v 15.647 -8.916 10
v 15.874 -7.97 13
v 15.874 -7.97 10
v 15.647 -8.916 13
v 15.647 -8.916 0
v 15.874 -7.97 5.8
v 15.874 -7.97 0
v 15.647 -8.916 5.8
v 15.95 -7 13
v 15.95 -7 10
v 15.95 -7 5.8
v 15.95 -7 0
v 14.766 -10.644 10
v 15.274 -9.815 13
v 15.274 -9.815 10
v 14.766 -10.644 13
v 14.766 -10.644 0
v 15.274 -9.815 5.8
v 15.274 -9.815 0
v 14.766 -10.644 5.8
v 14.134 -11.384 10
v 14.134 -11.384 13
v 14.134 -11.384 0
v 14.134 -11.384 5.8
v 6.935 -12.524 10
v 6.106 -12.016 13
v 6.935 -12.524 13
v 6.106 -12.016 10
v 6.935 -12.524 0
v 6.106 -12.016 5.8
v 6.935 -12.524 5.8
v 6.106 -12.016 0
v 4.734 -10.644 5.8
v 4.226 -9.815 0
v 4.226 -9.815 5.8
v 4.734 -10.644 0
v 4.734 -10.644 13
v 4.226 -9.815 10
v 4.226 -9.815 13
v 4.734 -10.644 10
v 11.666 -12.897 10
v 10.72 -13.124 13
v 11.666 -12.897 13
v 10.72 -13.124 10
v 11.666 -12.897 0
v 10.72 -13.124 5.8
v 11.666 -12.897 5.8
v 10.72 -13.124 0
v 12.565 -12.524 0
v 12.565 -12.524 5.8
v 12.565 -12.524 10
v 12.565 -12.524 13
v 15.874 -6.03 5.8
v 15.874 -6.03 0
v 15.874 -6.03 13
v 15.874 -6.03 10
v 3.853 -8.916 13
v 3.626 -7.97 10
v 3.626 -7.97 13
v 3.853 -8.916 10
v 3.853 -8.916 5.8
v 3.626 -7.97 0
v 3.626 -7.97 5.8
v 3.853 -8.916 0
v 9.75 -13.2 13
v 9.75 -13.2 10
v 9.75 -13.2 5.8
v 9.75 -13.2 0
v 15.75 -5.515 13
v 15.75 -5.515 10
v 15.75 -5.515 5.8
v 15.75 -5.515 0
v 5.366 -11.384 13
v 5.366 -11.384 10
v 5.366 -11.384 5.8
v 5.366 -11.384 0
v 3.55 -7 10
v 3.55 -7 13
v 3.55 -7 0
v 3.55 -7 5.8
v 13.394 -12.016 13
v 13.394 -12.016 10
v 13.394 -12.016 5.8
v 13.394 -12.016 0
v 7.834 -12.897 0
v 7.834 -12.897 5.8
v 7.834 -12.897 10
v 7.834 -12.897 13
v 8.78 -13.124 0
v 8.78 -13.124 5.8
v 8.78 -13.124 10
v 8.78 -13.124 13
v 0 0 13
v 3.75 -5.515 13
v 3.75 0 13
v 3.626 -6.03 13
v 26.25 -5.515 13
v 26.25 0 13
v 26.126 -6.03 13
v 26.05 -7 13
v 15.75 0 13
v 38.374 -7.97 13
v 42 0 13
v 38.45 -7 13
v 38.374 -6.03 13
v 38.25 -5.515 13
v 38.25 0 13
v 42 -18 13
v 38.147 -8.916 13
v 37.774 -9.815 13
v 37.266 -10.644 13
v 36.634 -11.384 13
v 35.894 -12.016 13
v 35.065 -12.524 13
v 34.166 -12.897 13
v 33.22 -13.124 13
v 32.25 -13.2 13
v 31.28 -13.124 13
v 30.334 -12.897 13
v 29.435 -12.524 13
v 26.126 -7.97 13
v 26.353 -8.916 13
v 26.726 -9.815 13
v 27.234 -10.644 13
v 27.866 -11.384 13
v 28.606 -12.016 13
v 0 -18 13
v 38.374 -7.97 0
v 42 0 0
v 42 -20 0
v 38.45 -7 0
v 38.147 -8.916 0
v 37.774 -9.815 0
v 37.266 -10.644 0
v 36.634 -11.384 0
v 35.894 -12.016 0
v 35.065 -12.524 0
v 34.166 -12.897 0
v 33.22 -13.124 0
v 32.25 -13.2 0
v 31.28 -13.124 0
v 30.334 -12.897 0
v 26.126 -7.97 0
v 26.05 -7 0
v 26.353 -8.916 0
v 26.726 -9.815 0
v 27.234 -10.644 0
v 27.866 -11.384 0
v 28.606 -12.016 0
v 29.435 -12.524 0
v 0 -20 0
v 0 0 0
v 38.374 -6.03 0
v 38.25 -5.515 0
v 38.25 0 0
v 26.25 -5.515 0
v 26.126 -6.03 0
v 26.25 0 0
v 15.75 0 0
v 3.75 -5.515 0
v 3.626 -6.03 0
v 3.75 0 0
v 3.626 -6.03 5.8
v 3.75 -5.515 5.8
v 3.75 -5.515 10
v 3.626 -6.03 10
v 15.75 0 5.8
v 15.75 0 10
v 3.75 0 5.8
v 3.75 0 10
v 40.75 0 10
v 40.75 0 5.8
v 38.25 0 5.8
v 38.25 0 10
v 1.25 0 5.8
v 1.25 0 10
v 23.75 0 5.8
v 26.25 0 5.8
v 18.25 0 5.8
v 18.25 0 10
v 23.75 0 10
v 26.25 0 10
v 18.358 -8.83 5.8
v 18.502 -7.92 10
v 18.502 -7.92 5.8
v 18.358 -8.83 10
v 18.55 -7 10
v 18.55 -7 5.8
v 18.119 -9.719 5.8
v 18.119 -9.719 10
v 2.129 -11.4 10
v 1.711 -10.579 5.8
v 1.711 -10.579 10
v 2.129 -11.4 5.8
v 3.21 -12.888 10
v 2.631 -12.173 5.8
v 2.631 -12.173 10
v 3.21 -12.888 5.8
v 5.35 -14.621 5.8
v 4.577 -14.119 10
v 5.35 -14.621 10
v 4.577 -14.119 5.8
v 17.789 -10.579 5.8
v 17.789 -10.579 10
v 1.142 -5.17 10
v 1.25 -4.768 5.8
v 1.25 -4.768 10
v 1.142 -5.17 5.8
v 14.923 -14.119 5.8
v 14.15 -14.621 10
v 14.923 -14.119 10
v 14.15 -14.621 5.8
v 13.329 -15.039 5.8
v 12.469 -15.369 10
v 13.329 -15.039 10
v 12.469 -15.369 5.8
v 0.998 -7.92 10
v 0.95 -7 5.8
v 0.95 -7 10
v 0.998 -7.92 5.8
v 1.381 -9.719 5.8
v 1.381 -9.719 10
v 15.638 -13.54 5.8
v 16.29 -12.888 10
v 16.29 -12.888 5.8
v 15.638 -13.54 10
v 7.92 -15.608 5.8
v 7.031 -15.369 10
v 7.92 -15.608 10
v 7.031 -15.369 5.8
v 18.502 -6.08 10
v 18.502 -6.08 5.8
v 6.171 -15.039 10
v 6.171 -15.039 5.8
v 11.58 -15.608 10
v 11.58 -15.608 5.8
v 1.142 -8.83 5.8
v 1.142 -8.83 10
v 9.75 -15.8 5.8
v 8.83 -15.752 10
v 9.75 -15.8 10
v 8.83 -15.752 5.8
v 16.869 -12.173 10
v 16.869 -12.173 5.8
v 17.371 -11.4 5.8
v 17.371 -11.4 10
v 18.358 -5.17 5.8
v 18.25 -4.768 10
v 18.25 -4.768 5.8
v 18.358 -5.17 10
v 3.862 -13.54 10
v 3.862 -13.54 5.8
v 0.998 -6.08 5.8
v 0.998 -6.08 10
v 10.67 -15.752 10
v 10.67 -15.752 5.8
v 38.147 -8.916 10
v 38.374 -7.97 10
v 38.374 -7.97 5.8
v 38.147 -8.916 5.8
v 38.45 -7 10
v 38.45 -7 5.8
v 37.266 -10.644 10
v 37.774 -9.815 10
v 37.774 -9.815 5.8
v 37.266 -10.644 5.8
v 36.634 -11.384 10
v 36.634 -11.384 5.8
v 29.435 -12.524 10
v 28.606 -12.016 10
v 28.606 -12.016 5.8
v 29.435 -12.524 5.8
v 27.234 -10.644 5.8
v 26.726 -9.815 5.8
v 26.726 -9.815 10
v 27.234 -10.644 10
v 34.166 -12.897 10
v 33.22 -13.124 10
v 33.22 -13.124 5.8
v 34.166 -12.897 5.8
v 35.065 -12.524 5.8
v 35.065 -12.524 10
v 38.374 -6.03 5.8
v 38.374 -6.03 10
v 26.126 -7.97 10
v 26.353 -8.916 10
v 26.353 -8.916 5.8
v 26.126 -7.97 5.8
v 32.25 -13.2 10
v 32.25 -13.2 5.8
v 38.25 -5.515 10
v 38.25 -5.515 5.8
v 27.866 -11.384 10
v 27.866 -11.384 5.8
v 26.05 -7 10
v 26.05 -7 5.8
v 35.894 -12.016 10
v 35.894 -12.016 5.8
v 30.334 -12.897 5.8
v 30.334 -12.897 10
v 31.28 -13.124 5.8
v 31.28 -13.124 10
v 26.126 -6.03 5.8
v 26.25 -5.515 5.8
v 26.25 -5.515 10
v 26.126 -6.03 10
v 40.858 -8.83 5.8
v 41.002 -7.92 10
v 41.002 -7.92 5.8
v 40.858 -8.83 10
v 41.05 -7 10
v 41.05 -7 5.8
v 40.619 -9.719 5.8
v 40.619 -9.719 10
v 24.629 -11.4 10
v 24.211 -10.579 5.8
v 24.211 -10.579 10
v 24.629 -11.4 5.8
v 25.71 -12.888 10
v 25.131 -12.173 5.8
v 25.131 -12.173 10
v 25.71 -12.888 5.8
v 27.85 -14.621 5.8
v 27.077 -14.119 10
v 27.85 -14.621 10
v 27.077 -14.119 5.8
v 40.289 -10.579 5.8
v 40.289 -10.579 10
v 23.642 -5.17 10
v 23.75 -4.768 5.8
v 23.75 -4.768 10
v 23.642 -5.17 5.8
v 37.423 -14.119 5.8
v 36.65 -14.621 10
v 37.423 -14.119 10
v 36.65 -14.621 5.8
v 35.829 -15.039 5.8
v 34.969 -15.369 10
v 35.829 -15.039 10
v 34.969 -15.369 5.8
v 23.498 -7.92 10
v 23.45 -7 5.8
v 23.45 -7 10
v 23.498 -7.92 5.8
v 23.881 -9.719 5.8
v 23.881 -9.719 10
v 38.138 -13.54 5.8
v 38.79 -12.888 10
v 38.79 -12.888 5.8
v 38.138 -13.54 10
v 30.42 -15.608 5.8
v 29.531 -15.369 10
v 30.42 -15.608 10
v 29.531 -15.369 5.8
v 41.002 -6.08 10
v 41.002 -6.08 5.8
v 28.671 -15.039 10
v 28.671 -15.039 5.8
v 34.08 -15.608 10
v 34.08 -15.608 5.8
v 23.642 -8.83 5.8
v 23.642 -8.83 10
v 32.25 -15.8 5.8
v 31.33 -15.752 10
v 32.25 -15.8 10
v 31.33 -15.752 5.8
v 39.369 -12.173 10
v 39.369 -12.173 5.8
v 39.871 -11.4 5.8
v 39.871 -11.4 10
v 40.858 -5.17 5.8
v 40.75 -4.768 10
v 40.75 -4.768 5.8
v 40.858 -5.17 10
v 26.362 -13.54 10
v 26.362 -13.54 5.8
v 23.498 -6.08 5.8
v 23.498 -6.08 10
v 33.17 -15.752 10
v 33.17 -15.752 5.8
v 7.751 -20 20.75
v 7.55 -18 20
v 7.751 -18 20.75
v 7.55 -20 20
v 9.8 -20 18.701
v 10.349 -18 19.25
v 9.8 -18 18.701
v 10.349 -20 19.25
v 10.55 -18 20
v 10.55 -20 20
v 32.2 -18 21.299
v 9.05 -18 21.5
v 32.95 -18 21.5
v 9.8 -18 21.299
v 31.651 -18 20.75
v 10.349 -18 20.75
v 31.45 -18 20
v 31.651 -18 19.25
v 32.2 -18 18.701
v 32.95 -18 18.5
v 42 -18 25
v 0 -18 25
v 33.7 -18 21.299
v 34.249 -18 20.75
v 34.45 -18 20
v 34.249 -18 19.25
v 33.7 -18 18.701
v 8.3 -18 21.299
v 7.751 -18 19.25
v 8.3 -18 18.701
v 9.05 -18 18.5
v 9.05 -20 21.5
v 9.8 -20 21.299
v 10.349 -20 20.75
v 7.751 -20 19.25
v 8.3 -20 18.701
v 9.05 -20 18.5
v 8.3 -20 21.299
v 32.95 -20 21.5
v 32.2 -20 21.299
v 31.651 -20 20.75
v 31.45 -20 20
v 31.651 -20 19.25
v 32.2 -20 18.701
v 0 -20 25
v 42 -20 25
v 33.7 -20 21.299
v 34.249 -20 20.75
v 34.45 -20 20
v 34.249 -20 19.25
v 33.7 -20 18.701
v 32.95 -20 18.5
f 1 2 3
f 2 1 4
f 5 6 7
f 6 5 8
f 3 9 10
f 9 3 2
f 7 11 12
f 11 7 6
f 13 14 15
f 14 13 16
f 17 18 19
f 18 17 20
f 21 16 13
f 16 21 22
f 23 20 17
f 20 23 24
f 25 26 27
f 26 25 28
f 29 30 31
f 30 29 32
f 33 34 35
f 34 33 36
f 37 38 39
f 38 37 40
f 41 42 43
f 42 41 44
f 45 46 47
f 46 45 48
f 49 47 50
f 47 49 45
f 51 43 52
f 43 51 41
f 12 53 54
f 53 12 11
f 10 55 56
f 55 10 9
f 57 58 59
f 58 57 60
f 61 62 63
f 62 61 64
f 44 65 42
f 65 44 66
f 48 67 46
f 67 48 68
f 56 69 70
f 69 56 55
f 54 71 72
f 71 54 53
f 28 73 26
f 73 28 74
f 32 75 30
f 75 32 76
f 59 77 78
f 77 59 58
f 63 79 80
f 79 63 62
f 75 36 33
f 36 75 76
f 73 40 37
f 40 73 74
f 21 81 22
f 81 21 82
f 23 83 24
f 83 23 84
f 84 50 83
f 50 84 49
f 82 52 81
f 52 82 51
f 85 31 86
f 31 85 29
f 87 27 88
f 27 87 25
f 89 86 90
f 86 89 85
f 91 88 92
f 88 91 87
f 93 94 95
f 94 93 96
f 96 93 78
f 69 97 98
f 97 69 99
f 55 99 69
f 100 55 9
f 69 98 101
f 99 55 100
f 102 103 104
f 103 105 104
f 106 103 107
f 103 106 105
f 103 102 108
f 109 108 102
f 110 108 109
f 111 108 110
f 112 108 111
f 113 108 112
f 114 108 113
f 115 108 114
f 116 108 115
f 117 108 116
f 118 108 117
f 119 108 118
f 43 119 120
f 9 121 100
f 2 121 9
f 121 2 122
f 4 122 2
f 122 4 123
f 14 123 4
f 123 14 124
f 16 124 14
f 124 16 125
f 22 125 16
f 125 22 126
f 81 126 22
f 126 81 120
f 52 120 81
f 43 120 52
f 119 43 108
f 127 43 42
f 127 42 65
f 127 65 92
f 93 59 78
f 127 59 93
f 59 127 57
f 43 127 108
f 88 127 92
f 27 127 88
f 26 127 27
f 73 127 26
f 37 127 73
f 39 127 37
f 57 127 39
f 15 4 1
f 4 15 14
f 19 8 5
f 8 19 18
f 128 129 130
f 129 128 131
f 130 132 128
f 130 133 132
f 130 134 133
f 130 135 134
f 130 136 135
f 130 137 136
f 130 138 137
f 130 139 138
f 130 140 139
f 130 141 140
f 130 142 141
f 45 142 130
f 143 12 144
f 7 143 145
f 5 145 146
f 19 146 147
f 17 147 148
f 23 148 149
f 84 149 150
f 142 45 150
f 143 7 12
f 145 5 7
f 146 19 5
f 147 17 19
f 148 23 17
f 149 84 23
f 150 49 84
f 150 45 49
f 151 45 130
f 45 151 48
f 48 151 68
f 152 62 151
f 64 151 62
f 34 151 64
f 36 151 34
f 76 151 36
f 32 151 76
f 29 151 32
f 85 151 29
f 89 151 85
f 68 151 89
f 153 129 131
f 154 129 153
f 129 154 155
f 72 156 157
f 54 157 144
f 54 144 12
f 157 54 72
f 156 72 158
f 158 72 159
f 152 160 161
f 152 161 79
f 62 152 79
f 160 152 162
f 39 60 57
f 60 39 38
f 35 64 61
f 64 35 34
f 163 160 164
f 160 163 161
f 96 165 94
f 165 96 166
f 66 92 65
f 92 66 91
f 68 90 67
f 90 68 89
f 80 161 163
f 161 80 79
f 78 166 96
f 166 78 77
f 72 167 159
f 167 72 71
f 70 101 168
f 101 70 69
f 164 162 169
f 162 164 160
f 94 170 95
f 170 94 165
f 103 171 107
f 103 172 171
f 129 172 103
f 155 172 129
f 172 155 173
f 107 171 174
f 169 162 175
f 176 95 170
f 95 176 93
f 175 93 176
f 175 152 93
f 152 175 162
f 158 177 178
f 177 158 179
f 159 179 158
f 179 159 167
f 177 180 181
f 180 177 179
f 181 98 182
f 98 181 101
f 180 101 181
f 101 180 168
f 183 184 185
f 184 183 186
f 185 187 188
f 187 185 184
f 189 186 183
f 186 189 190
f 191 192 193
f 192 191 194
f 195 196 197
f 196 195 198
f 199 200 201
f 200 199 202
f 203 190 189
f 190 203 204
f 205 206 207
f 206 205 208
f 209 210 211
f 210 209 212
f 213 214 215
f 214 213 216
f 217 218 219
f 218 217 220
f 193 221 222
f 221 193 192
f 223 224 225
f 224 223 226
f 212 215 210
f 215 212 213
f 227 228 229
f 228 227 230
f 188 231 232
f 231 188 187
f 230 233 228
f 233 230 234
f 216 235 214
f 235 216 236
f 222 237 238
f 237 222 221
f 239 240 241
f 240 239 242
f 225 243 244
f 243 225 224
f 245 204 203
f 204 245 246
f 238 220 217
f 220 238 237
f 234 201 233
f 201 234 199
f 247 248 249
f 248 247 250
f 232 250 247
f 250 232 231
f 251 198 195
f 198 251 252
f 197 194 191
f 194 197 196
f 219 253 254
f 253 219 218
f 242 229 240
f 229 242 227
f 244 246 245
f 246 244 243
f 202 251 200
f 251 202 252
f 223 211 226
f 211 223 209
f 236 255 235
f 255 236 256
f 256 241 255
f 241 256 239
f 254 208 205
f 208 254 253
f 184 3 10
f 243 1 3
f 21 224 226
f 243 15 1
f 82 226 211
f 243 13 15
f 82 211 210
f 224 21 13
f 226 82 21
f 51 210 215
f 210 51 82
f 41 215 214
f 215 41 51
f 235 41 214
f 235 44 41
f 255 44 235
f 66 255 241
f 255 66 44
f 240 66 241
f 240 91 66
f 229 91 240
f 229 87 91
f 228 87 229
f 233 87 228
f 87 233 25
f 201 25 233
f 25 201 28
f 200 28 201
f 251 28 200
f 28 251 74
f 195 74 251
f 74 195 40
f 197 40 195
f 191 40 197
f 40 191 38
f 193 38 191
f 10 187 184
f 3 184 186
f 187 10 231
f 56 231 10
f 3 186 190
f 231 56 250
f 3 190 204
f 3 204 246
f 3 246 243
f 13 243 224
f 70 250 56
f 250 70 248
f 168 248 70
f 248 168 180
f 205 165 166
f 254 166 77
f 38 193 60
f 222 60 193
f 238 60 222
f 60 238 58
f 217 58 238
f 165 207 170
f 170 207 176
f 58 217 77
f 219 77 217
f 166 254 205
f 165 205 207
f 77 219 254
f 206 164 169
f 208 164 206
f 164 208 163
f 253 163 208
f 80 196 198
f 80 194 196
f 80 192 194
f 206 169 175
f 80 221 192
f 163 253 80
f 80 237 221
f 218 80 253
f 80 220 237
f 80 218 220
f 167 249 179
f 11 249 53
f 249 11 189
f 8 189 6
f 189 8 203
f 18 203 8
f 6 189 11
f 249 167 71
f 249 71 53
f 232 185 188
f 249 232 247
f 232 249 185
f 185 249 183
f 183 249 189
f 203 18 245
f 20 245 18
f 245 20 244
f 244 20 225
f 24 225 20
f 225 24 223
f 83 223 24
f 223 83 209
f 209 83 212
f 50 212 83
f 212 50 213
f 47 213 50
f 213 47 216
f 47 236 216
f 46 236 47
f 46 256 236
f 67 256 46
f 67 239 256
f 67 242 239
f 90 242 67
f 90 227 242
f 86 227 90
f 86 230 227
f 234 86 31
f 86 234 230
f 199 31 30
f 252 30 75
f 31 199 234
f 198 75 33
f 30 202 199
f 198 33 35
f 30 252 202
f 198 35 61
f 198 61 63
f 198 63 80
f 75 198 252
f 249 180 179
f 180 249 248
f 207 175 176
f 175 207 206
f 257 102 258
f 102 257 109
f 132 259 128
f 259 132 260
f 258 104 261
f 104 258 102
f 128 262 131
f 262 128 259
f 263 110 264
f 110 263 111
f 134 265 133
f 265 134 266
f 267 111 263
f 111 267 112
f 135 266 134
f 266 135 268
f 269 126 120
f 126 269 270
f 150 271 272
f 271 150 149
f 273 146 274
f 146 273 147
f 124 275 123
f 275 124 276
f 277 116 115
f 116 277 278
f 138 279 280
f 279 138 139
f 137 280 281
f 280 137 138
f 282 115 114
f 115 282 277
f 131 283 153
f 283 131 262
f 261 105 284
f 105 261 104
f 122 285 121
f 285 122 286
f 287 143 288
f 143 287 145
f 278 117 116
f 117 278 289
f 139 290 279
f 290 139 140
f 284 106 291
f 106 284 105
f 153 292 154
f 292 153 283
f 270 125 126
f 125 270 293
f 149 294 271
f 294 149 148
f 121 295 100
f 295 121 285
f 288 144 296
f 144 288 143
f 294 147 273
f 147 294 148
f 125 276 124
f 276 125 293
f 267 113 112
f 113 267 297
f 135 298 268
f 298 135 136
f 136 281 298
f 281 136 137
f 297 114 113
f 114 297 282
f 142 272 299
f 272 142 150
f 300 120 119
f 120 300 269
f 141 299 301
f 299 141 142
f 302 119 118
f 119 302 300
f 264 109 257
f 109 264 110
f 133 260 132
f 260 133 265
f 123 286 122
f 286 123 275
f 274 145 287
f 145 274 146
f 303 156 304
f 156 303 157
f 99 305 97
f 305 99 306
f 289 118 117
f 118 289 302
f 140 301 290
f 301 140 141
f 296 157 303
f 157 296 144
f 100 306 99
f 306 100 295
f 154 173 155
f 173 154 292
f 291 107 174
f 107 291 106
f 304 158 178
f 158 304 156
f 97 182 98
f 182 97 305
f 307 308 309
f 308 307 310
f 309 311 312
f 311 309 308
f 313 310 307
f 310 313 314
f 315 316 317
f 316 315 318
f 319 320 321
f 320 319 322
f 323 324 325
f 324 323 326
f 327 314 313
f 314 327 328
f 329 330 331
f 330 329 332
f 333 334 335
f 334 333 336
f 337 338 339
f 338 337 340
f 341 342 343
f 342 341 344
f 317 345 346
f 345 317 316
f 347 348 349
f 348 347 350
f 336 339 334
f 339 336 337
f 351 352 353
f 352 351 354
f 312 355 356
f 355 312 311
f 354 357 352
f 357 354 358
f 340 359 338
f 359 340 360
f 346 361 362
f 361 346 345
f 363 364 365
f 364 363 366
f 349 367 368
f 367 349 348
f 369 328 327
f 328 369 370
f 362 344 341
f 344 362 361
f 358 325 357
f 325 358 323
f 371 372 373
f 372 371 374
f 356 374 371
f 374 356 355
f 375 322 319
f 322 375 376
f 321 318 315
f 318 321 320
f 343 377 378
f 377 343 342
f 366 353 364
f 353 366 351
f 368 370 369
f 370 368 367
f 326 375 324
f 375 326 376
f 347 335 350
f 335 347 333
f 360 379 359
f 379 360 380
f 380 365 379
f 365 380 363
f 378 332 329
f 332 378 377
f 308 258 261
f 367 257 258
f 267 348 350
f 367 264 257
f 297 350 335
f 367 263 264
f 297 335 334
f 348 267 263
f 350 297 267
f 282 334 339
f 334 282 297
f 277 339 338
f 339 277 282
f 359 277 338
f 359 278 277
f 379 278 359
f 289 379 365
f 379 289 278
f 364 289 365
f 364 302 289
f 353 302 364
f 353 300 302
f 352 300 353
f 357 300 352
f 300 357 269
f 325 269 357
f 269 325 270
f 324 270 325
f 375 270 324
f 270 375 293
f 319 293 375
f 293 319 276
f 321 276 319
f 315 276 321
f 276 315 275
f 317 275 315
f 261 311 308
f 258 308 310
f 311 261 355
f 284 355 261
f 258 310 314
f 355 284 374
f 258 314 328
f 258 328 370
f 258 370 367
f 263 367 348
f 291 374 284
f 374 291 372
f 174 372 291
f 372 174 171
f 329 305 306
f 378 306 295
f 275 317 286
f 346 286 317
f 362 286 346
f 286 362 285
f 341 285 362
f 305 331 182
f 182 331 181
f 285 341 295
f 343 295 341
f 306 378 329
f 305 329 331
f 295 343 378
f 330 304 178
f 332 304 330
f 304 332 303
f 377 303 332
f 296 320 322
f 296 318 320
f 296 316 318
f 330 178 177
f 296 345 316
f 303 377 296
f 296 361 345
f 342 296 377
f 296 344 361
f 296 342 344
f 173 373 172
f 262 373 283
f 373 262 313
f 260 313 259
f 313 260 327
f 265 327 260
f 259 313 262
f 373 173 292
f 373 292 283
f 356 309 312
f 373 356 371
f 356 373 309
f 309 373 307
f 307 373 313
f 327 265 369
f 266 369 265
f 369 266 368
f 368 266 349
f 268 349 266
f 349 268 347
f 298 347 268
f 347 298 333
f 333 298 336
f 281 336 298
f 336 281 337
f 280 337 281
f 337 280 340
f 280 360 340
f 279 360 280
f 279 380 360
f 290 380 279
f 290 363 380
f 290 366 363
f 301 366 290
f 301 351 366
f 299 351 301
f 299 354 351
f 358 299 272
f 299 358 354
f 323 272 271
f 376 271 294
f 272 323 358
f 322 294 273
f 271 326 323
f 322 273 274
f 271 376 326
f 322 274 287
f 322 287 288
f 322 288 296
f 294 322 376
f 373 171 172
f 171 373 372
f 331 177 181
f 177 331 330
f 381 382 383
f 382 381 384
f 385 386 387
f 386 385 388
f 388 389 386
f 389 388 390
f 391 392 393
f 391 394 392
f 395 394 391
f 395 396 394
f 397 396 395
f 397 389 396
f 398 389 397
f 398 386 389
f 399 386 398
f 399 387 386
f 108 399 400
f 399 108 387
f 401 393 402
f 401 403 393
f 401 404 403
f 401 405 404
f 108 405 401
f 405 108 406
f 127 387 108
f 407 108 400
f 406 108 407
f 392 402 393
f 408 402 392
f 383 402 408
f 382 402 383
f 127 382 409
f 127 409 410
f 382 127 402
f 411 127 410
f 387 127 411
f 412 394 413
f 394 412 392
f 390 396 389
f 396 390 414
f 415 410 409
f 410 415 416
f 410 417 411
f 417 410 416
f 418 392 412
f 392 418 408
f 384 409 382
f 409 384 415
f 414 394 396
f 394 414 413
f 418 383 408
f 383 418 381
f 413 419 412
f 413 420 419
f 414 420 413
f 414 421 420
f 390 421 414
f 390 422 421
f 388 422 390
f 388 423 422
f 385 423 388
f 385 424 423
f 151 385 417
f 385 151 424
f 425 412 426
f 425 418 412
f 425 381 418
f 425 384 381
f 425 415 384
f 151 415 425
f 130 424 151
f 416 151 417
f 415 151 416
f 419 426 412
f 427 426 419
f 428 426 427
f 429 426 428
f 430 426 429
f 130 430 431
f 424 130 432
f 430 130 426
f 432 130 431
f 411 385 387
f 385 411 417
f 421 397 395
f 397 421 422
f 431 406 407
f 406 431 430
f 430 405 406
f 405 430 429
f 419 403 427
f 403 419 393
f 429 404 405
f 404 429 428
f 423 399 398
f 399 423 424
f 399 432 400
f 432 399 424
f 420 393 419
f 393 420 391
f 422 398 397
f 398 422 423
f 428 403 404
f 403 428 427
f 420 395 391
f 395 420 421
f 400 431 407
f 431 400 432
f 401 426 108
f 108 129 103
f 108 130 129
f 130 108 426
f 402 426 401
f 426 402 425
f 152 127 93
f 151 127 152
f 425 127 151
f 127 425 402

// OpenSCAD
/*
Heads to be 22.5mm apart, this is the heatsink width
Mount holes 23.9mm apart, embedded under heads
mount uses 3mm screws with 6mm head hole
*/

module j_head_mount(){
    union(){ //center hole
    translate ([0,7,0]) cylinder(13, 6.2, 6.2, center = false, $fn=40);
    translate ([-6,0,0]) cube([12,7,13], center = false);
    translate ([0,7,3]) cylinder(4.2, 8.8, 8.8, center = false, $fn=60);
    translate ([-8.5,0,3]) cube([17,7,4.2], center = false);
    }
}


difference(){
    
translate([0,-20,0]) cube([42,20,25]);
    
for (i=[9.75,32.25]){
    translate([i,0,13])
    rotate([180,0,0])
    j_head_mount();
}

translate([0,-18,13]) cube([42,18,13]);

for (i=[9.05,32.95]){
     translate([i,-20,20]) rotate([270,0,0]) cylinder(2,1.5,1.5, $fn=12);
}

}
